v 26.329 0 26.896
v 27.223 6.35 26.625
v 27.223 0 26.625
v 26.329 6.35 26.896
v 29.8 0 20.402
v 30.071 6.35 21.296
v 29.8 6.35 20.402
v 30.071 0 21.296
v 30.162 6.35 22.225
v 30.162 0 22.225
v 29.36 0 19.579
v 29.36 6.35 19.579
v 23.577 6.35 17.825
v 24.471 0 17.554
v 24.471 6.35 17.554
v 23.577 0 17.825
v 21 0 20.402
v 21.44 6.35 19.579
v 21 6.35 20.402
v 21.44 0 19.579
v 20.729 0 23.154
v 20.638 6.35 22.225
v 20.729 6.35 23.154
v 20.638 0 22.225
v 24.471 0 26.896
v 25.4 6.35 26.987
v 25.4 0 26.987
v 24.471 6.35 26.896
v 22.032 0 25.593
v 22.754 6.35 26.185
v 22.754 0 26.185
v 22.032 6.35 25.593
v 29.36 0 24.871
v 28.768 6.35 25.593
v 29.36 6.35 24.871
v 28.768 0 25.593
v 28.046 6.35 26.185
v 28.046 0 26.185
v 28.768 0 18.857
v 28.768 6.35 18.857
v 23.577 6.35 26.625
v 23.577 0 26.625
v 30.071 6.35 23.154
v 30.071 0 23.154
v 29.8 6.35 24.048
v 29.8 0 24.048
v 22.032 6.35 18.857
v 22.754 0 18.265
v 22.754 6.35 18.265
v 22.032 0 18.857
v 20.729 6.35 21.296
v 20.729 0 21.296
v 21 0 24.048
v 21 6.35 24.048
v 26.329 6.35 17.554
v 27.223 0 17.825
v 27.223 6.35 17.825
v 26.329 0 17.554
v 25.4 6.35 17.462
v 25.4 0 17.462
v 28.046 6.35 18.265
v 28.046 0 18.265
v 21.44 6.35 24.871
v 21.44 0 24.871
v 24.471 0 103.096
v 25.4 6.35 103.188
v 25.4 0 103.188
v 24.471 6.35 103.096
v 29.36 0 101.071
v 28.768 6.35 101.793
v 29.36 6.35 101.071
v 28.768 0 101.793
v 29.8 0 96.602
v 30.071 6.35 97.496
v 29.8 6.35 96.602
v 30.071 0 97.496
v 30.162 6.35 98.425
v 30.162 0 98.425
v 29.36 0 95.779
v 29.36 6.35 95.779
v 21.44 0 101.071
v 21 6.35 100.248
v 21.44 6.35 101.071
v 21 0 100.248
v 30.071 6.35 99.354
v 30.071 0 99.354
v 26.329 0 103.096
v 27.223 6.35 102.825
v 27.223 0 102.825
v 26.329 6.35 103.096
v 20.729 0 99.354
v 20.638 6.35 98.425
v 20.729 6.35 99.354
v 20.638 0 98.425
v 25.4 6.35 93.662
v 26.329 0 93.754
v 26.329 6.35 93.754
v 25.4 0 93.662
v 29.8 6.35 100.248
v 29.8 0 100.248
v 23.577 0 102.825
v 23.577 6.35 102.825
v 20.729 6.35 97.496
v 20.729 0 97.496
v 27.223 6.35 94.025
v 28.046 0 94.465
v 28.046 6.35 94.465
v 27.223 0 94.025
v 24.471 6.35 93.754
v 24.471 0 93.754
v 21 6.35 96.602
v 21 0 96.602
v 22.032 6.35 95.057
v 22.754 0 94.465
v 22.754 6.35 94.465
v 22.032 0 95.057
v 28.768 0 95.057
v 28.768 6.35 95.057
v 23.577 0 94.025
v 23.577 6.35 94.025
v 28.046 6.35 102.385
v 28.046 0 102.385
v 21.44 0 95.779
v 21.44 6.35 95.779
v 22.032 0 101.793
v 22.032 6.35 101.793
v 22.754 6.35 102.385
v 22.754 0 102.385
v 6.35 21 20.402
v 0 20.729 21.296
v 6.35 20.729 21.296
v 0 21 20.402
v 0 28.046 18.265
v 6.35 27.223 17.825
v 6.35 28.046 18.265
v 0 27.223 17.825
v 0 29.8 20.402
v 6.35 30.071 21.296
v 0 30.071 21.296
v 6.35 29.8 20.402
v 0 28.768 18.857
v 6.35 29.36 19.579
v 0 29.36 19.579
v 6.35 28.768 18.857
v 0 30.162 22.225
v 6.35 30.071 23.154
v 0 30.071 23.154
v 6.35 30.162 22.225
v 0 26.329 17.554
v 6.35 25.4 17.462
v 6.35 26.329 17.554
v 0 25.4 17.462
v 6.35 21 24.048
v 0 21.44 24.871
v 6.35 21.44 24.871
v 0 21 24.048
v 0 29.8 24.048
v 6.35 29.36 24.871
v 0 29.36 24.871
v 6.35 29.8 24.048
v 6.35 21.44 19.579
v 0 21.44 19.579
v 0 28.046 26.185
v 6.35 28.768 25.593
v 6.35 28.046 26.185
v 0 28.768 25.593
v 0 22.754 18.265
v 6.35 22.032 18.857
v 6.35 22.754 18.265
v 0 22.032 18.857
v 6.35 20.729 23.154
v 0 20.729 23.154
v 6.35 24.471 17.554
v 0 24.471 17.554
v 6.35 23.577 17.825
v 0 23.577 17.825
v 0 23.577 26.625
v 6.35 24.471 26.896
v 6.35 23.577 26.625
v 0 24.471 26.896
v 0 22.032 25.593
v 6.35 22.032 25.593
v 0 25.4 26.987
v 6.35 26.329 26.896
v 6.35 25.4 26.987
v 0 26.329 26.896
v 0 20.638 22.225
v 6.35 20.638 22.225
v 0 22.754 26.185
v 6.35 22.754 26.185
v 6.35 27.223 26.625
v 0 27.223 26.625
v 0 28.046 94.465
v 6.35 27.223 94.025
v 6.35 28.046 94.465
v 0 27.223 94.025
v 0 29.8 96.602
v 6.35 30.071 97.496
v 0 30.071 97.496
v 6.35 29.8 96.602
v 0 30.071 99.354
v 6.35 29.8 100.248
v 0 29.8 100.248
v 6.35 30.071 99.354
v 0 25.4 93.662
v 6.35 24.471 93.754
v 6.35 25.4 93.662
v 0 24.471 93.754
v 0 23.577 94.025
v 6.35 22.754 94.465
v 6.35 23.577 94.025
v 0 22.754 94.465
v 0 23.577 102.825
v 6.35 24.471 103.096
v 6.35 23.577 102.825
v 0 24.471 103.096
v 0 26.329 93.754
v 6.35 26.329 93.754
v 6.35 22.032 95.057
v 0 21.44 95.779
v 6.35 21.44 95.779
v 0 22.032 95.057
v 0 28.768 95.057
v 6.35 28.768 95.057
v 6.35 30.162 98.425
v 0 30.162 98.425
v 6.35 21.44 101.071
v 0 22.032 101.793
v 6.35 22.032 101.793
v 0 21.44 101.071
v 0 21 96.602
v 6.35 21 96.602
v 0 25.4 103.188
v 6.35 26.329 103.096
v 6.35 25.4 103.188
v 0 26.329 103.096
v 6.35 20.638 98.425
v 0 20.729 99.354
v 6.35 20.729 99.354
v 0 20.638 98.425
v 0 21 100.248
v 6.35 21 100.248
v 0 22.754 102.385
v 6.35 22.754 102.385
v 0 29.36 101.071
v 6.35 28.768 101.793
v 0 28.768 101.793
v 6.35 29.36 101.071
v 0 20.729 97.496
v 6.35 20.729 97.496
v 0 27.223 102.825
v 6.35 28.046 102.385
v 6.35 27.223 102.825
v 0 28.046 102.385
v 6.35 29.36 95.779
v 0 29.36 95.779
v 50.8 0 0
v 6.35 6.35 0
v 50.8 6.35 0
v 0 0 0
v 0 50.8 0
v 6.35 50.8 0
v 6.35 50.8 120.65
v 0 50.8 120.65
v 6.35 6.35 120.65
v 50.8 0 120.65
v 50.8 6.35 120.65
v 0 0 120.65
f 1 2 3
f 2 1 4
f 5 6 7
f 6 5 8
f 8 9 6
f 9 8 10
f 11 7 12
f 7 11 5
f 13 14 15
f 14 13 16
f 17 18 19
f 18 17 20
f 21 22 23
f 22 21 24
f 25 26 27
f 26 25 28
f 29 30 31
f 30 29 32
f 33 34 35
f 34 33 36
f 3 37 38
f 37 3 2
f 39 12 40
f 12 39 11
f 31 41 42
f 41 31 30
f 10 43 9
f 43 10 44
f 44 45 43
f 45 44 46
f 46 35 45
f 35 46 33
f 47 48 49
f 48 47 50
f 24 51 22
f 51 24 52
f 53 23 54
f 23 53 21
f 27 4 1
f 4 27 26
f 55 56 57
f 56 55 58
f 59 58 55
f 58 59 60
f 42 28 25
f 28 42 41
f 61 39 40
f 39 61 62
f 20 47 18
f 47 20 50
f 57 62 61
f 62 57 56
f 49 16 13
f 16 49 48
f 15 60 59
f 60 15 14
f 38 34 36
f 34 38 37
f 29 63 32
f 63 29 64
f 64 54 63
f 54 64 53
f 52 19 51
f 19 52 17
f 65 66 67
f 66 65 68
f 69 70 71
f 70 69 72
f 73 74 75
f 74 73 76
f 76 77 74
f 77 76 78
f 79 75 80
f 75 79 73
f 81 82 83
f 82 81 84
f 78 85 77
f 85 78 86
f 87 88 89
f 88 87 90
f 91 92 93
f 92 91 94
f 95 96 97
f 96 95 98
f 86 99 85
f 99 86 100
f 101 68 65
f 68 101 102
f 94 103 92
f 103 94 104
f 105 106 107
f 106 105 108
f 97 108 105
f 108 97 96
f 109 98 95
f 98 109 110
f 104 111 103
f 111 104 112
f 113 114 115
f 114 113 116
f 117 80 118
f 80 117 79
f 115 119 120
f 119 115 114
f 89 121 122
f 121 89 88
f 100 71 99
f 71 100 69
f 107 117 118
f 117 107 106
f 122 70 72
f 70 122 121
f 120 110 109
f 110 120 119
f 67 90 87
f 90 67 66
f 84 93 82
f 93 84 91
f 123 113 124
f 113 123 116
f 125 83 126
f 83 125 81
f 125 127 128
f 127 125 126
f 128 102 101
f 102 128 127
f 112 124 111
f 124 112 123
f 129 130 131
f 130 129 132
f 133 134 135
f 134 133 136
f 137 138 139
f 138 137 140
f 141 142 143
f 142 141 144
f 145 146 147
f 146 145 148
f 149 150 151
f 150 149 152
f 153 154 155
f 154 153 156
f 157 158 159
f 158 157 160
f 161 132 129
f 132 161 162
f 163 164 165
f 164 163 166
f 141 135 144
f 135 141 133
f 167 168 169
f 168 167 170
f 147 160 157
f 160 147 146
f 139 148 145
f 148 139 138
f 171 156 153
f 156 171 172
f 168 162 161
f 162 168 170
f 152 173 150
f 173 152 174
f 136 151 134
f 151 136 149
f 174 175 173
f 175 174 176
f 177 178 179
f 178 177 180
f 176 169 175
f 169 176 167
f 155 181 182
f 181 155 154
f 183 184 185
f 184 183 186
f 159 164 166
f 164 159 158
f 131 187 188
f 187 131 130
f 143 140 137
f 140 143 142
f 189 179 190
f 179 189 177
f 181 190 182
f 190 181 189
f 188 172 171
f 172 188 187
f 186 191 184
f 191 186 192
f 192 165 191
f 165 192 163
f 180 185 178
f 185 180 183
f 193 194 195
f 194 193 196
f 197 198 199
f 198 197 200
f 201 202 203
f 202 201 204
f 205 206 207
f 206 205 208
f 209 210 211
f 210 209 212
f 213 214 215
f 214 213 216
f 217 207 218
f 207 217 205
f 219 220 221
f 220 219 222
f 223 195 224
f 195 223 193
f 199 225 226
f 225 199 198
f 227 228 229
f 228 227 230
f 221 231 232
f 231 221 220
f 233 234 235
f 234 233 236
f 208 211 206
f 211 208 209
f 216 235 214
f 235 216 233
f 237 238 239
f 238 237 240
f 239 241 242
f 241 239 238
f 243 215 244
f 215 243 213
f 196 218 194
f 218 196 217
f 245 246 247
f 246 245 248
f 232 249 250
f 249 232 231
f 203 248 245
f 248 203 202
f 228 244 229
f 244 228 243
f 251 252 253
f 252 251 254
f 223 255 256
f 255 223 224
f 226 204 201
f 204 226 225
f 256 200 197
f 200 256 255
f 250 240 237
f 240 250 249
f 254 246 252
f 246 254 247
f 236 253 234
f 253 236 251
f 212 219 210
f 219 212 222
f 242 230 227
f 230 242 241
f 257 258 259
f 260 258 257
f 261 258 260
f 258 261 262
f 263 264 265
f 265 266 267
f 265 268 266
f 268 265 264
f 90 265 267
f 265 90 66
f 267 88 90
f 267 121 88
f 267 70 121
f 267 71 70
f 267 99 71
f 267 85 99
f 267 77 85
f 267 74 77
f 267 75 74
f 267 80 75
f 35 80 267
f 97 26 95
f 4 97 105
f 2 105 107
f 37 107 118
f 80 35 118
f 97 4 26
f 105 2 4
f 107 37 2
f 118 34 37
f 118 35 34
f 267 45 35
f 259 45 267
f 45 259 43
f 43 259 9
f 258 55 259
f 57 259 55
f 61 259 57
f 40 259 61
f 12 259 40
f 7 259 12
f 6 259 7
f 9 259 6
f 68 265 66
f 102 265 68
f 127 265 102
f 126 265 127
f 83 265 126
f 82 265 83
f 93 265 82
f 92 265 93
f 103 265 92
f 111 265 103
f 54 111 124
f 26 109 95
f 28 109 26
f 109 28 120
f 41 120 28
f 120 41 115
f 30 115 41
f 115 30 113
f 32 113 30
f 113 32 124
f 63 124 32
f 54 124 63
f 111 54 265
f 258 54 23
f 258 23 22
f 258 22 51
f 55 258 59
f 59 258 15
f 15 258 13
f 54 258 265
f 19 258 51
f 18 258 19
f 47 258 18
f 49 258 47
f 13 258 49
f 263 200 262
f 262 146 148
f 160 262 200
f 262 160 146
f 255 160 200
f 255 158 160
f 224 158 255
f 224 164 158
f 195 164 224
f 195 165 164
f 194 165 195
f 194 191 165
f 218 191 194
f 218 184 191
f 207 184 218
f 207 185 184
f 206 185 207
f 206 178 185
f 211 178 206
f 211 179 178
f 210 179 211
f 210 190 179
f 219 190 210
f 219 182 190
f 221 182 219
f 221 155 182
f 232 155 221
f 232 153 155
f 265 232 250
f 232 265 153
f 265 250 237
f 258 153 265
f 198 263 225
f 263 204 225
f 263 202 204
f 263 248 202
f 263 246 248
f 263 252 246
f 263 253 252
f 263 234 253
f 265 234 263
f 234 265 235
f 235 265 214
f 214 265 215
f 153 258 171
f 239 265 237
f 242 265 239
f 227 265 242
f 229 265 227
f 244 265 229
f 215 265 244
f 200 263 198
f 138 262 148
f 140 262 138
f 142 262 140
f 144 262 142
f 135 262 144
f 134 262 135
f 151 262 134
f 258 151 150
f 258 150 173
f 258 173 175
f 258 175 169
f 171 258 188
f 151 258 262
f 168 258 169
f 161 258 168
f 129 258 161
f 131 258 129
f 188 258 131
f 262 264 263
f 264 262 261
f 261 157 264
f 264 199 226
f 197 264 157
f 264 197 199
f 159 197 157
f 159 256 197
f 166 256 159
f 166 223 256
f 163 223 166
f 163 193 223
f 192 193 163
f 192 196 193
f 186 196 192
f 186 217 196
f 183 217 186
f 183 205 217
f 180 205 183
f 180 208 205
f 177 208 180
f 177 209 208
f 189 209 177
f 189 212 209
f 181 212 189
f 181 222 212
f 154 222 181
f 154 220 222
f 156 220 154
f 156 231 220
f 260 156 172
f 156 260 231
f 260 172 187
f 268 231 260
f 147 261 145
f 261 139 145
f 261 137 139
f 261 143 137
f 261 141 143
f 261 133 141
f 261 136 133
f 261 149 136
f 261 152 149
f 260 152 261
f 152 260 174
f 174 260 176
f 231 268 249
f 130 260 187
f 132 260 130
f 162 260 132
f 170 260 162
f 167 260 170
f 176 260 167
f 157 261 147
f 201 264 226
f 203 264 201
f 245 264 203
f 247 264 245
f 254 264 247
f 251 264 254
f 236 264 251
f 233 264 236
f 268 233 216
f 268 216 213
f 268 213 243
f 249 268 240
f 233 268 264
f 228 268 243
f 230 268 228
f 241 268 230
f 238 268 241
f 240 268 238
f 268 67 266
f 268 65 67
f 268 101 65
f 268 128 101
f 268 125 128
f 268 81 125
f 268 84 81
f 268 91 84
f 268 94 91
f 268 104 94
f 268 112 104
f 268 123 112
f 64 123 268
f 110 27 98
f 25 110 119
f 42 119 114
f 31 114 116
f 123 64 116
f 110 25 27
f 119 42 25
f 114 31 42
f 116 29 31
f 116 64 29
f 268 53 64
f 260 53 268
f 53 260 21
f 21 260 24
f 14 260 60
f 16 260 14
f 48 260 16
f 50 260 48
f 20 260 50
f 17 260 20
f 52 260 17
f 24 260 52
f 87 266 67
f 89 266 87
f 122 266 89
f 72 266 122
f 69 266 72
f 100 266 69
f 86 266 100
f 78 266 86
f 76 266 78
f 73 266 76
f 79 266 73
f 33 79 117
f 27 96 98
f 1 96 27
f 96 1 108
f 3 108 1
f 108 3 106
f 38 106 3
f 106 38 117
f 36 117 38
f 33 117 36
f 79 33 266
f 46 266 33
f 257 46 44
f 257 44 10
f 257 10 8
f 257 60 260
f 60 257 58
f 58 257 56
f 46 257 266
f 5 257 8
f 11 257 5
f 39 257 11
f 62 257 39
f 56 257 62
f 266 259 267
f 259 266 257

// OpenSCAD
// Part A10: Front Stiffener Outer Section Angle Iron
// Material: 2"×2"×1/4" Angle Iron (50.8mm leg × 6.35mm thickness)
// Quantity: 8 pieces total
//   - 2 on outer walls (left and right)
//   - 4 on inner walls (2 per side, both faces)
//   - 2 on motor plates, outer side (left and right)
// Location: Front stiffener plate, 5" outer sections
//
// Shorter than center angles: ~4.75" (120.65mm)
// Used in the 5" tall outer sections between motor plates and outer walls
// Bolt pattern: 3/8" bolts, 3" spacing

include <../../lifetrac_v25_params.scad>

// =============================================================================
// PART DIMENSIONS
// =============================================================================

_leg = 50.8;    // 2" angle leg
_thick = 6.35;  // 1/4" thickness
_trim = 3.175;  // 1/8" trimmed from each end
_outer_height = 127.0;  // 5" outer section height

PART_A10_HEIGHT = _outer_height - 2*_trim;  // ~120.65mm (4.75")
PART_A10_LEG = _leg;
PART_A10_THICK = _thick;

// Bolt parameters (smaller pattern for outer sections)
_bolt_dia = is_undef(BOLT_DIA_3_8) ? 9.525 : BOLT_DIA_3_8;  // 3/8" bolts
_outer_bolt_offset = 38.1;  // 1.5" from center (3" total spacing)
_hole_offset = _leg / 2;    // Center of angle leg

// =============================================================================
// MAIN MODULE
// =============================================================================

/**
 * Part A10: Front Stiffener Outer Section Angle Iron
 * Vertical angle iron for 5" outer sections of front stiffener
 * show_holes: if true, renders bolt holes
 */
module _part_a10_front_outer_angle(show_holes=true) {
    height = PART_A10_HEIGHT;
    leg = PART_A10_LEG;
    thick = PART_A10_THICK;
    
    color("Silver")
    difference() {
        // L-profile
        linear_extrude(height=height)
        polygon([
            [0, 0],
            [leg, 0],
            [leg, thick],
            [thick, thick],
            [thick, leg],
            [0, leg]
        ]);
        
        if (show_holes) {
            // Vertical leg holes (through thickness, bolt to plate)
            // 2 holes at 3" spacing centered on height
            _center_z = height / 2;
            for (z_off = [-_outer_bolt_offset, _outer_bolt_offset]) {
                translate([_hole_offset, -1, _center_z + z_off])
                rotate([-90, 0, 0])
                cylinder(d=_bolt_dia, h=thick + 2, $fn=32);
            }
            
            // Horizontal leg holes (through thickness, bolt to stiffener plate)
            for (z_off = [-_outer_bolt_offset, _outer_bolt_offset]) {
                translate([-1, _hole_offset, _center_z + z_off])
                rotate([0, 90, 0])
                cylinder(d=_bolt_dia, h=thick + 2, $fn=32);
            }
        }
    }
}

// =============================================================================
// RENDER
// =============================================================================

_part_a10_front_outer_angle(show_holes=true);

echo("=== PART A10: Front Stiffener Outer Section Angle Iron ===");
echo("Height:", PART_A10_HEIGHT, "mm (", PART_A10_HEIGHT/25.4, "in)");
echo("Leg:", PART_A10_LEG, "mm (2 inches)");
echo("Thickness:", PART_A10_THICK, "mm (1/4 inch)");
echo("Bolt pattern: 2 holes per leg, 3\" spacing, 3/8\" dia");
echo("Quantity needed: 8 pieces total");
echo("  - 2 at outer walls (left, right)");
echo("  - 4 at inner walls (2 per side)");
echo("  - 2 at motor plates outer face (left, right)");
